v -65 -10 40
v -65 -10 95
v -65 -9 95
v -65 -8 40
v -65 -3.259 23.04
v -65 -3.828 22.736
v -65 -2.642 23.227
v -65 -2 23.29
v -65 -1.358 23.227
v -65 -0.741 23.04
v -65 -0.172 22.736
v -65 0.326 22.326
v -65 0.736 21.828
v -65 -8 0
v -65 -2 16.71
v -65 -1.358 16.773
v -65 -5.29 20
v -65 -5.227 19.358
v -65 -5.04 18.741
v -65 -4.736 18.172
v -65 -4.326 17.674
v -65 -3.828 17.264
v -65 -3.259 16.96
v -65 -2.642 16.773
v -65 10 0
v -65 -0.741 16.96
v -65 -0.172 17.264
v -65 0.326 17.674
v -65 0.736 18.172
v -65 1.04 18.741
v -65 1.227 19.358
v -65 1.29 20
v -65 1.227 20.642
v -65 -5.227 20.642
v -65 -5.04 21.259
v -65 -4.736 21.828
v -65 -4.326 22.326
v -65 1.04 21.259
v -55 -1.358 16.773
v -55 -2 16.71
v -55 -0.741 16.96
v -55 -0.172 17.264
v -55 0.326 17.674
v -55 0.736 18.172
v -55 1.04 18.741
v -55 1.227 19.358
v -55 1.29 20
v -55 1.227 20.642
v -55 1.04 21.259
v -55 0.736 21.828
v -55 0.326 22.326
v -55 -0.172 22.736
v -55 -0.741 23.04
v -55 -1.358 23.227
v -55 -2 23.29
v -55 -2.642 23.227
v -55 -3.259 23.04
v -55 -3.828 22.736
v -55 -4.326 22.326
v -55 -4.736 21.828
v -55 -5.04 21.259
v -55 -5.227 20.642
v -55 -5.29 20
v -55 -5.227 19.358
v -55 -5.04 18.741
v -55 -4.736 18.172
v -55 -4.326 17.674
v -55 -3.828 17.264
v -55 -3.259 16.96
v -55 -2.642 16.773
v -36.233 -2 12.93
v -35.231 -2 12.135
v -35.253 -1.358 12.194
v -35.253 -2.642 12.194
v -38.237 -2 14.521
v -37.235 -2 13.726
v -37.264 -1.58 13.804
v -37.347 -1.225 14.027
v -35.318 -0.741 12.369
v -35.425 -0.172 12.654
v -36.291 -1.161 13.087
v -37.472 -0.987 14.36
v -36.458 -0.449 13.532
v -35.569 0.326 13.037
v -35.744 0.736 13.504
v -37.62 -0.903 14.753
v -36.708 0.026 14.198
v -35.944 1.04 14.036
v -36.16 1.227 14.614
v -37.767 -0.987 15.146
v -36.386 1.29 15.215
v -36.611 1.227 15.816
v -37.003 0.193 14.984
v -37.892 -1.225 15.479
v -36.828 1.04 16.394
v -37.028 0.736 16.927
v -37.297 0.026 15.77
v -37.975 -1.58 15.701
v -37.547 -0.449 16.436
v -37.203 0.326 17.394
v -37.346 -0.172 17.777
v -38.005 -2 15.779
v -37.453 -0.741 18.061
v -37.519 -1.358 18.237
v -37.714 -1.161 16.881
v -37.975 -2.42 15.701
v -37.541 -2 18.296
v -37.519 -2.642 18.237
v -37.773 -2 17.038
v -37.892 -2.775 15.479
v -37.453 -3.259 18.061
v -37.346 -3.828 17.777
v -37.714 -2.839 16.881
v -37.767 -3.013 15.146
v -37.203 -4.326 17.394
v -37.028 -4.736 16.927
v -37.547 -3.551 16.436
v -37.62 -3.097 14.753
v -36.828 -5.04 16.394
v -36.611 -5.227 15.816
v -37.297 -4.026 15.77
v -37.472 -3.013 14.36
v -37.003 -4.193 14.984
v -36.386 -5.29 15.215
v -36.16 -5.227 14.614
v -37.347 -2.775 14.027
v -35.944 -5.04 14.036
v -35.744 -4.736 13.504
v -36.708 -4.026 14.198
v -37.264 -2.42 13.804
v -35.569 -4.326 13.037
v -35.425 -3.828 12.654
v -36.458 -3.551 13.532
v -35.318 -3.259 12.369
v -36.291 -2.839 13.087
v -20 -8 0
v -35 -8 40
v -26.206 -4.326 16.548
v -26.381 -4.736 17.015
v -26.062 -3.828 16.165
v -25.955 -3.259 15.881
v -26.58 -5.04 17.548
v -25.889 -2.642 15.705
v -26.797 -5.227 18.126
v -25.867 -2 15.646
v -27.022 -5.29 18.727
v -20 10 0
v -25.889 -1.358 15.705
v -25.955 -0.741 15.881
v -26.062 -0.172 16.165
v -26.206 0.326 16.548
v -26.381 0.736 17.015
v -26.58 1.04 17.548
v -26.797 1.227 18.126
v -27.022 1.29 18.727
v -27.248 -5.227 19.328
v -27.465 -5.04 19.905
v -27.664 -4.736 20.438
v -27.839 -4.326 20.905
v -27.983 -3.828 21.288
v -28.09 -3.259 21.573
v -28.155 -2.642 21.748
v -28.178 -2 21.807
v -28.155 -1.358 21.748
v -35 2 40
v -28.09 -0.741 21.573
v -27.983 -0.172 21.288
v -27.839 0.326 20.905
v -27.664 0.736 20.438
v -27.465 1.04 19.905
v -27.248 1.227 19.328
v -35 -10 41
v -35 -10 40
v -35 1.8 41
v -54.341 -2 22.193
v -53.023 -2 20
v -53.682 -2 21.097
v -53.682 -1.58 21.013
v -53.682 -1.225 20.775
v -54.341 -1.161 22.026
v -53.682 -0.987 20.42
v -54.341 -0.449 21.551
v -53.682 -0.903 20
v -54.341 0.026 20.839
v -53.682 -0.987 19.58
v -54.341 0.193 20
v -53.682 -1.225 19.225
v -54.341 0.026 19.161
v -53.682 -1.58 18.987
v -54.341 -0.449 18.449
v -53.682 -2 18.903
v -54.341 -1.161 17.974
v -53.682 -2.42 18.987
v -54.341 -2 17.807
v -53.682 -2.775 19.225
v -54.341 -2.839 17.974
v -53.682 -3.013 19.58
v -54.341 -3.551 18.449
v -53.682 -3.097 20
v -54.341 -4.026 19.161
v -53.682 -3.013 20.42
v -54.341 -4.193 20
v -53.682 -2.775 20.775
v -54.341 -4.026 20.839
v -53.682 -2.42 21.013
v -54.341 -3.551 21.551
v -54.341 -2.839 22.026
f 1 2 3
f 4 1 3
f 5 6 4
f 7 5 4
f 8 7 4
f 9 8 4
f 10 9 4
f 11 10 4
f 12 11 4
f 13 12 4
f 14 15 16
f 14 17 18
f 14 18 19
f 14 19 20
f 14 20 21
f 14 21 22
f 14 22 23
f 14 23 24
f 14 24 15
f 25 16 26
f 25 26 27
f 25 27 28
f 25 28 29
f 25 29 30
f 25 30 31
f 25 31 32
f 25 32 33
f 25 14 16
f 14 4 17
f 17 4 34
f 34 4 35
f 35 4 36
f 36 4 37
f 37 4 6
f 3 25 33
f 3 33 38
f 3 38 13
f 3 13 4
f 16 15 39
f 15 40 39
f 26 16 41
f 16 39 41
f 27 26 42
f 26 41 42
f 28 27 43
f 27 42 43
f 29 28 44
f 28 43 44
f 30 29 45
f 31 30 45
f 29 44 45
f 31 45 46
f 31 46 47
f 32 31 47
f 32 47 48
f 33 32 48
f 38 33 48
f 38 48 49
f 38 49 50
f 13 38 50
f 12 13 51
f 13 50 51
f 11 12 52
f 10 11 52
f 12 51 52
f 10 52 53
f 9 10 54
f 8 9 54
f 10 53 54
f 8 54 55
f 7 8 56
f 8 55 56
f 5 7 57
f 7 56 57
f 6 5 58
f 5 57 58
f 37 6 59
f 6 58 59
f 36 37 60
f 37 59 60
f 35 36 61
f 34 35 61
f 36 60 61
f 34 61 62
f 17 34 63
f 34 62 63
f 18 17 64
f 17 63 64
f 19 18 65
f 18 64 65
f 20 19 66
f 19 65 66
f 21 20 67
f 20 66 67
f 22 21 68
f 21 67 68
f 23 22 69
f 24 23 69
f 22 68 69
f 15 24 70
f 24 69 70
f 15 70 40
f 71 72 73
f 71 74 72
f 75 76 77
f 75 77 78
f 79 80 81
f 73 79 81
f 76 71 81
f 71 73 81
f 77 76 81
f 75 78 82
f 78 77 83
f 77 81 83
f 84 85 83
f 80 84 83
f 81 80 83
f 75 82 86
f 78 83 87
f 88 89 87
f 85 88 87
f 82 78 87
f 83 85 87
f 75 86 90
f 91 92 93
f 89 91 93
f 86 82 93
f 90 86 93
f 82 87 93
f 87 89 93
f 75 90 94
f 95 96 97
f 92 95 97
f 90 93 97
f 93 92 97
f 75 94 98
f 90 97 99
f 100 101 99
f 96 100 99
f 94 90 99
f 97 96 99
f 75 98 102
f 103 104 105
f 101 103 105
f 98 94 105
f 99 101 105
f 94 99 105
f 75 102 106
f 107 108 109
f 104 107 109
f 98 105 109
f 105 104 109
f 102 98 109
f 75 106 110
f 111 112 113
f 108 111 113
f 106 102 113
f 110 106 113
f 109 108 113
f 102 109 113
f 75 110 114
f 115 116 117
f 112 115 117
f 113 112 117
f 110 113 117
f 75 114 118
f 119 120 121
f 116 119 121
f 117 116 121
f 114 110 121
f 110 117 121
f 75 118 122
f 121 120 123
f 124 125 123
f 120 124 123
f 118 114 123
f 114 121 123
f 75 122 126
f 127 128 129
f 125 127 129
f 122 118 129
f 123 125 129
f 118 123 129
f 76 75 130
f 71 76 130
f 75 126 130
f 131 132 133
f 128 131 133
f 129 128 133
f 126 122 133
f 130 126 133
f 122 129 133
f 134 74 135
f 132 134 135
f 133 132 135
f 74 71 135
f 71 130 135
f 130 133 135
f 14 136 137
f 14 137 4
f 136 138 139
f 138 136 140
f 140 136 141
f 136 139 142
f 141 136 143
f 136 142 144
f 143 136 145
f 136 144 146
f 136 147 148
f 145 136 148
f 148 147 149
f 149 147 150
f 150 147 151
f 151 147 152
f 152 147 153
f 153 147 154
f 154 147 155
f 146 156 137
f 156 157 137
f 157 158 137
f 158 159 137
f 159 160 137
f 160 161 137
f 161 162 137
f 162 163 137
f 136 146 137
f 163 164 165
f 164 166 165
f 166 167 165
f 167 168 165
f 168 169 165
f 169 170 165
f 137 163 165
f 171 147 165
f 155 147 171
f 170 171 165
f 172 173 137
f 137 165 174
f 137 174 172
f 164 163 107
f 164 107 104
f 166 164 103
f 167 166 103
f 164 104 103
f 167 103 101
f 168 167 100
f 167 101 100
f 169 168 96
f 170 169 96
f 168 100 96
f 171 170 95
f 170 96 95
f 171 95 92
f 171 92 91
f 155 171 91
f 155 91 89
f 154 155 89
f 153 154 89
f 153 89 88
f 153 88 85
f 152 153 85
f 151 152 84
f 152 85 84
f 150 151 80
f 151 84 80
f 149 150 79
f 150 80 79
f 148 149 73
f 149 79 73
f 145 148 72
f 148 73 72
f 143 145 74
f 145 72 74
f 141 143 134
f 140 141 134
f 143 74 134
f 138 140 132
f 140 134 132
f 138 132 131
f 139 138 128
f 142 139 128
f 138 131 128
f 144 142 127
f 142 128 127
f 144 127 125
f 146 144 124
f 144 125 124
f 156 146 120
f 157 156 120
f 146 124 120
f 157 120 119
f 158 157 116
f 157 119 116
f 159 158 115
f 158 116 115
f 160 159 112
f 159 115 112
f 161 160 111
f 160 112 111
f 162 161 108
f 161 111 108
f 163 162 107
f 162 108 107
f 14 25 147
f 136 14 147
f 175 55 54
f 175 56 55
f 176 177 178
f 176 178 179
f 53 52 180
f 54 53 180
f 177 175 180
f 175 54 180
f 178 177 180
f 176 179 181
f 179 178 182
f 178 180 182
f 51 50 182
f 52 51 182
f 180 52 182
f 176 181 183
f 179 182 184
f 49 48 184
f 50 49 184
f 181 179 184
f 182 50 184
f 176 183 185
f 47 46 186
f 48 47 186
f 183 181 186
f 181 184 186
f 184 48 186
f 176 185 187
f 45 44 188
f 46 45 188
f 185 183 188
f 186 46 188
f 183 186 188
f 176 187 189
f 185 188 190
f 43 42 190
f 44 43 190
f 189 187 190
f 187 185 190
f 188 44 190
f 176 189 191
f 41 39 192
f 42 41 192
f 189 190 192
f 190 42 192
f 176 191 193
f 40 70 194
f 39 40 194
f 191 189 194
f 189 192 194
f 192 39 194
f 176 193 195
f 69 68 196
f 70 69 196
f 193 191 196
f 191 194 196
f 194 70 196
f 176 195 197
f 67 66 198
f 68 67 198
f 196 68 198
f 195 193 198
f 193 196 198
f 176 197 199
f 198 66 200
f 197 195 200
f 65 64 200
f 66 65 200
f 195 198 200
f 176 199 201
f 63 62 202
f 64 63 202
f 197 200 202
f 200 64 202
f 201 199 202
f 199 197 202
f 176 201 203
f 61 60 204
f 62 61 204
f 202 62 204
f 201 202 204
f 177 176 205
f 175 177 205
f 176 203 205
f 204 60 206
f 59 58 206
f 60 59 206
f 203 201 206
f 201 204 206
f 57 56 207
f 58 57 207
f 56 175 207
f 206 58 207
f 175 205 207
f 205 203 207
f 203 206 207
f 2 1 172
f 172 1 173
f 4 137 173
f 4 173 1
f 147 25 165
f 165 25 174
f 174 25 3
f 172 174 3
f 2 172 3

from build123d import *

# Parameters (mm, degrees)
ESBO_O1_W                                      = 130
ESBO_O1_H                                      = 20
RESSALTO_EXTRUS_O1_DEPTH                       = 95
CORTE_EXTRUS_O2_REACH                          = 22
CORTE_EXTRUS_O4_DEPTH                          = 1
CORTE_EXTRUS_O4_DEPTH_BACK                     = 46
BROCA_DE_ROSQUEAR_DE_CANO_PARA_TARRAXA_D_D     = 6.579997
BROCA_DE_ROSQUEAR_DE_CANO_PARA_TARRAXA_D_DEPTH = 10
BROCA_DE_ROSQUEAR_DE_CANO_PARA_TARRAXA_D_TIP   = 1.976830535
BROCA_DE_ROSQUEAR_DE_CANO_PARA_TARRA_2_D       = 6.579997
BROCA_DE_ROSQUEAR_DE_CANO_PARA_TARRA_2_DEPTH   = 10
BROCA_DE_ROSQUEAR_DE_CANO_PARA_TARRA_2_TIP     = 1.976830535
ESBO_O42_W                                     = 45
ESBO_O42_H                                     = 2
CORTE_EXTRUS_O5_DEPTH                          = 40


with BuildPart() as part:
    # Esboço1 → Ressalto-extrusão1 (new body)
    with BuildSketch(Plane.XY):
        Rectangle(ESBO_O1_W, ESBO_O1_H)
    extrude(amount=RESSALTO_EXTRUS_O1_DEPTH)

    # Esboço2 → Corte-extrusão2 (cut, up to next)
    with BuildSketch(Plane(origin=(0, 10, 0), x_dir=(1, 0, 0), z_dir=(0, 1, 0)), mode=Mode.PRIVATE) as corte_extrus_o2_sk1:
        Polygon((65, 0), (-20, 0), (-35, -40), (-35, -41), (-65, -95), (65, -95), align=None)
    corte_extrus_o2_tool1 = extrude(corte_extrus_o2_sk1.sketch, amount=-CORTE_EXTRUS_O2_REACH, mode=Mode.PRIVATE) & part.part
    add(corte_extrus_o2_tool1.solids().sort_by_distance((11.493506, 10, 50.911089))[0], mode=Mode.SUBTRACT)

    # Esboço13 → Corte-extrusão4 (cut, two sides)
    with BuildSketch(Plane.ZY.offset(65)) as corte_extrus_o4_sk:
        Polygon((-200.200134404, 50.040026881), (0, 10), (95, -9), (295.200134404, -49.040026881), (375.280188165, 351.360241926), (-120.120080642, 450.440295688), align=None)
    extrude(amount=CORTE_EXTRUS_O4_DEPTH, mode=Mode.SUBTRACT)
    extrude(corte_extrus_o4_sk.sketch, amount=-CORTE_EXTRUS_O4_DEPTH_BACK, mode=Mode.SUBTRACT)

    # Broca de rosquear de cano para tarraxa d
    with Locations(Plane.ZY.offset(65)):
        with Locations((20, -2)):
            Hole(BROCA_DE_ROSQUEAR_DE_CANO_PARA_TARRAXA_D_D / 2, depth=BROCA_DE_ROSQUEAR_DE_CANO_PARA_TARRAXA_D_DEPTH)
            with Locations((0, 0, -(BROCA_DE_ROSQUEAR_DE_CANO_PARA_TARRAXA_D_DEPTH + BROCA_DE_ROSQUEAR_DE_CANO_PARA_TARRAXA_D_TIP / 2))):  # 118° drill point
                Cone(0, BROCA_DE_ROSQUEAR_DE_CANO_PARA_TARRAXA_D_D / 2, BROCA_DE_ROSQUEAR_DE_CANO_PARA_TARRAXA_D_TIP, mode=Mode.SUBTRACT)

    # Broca de rosquear de cano para tarra 2
    with Locations(Plane(origin=(-17.534246575, 0, -6.575342466), x_dir=(0.351123442, 0, -0.936329178), z_dir=(0.936329178, 0, 0.351123442))):
        with Locations((-27.022468832, -2)):
            Hole(BROCA_DE_ROSQUEAR_DE_CANO_PARA_TARRA_2_D / 2, depth=BROCA_DE_ROSQUEAR_DE_CANO_PARA_TARRA_2_DEPTH)
            with Locations((0, 0, -(BROCA_DE_ROSQUEAR_DE_CANO_PARA_TARRA_2_DEPTH + BROCA_DE_ROSQUEAR_DE_CANO_PARA_TARRA_2_TIP / 2))):  # 118° drill point
                Cone(0, BROCA_DE_ROSQUEAR_DE_CANO_PARA_TARRA_2_D / 2, BROCA_DE_ROSQUEAR_DE_CANO_PARA_TARRA_2_TIP, mode=Mode.SUBTRACT)

    # Esboço42 → Corte-extrusão5 (cut)
    with BuildSketch(Plane(origin=(0, 0, 0), x_dir=(-1, 0, 0), z_dir=(0, 0, -1))):
        with Locations((42.5, -9)):
            Rectangle(ESBO_O42_W, ESBO_O42_H)
    extrude(amount=-CORTE_EXTRUS_O5_DEPTH, mode=Mode.SUBTRACT)


solid = part.part
